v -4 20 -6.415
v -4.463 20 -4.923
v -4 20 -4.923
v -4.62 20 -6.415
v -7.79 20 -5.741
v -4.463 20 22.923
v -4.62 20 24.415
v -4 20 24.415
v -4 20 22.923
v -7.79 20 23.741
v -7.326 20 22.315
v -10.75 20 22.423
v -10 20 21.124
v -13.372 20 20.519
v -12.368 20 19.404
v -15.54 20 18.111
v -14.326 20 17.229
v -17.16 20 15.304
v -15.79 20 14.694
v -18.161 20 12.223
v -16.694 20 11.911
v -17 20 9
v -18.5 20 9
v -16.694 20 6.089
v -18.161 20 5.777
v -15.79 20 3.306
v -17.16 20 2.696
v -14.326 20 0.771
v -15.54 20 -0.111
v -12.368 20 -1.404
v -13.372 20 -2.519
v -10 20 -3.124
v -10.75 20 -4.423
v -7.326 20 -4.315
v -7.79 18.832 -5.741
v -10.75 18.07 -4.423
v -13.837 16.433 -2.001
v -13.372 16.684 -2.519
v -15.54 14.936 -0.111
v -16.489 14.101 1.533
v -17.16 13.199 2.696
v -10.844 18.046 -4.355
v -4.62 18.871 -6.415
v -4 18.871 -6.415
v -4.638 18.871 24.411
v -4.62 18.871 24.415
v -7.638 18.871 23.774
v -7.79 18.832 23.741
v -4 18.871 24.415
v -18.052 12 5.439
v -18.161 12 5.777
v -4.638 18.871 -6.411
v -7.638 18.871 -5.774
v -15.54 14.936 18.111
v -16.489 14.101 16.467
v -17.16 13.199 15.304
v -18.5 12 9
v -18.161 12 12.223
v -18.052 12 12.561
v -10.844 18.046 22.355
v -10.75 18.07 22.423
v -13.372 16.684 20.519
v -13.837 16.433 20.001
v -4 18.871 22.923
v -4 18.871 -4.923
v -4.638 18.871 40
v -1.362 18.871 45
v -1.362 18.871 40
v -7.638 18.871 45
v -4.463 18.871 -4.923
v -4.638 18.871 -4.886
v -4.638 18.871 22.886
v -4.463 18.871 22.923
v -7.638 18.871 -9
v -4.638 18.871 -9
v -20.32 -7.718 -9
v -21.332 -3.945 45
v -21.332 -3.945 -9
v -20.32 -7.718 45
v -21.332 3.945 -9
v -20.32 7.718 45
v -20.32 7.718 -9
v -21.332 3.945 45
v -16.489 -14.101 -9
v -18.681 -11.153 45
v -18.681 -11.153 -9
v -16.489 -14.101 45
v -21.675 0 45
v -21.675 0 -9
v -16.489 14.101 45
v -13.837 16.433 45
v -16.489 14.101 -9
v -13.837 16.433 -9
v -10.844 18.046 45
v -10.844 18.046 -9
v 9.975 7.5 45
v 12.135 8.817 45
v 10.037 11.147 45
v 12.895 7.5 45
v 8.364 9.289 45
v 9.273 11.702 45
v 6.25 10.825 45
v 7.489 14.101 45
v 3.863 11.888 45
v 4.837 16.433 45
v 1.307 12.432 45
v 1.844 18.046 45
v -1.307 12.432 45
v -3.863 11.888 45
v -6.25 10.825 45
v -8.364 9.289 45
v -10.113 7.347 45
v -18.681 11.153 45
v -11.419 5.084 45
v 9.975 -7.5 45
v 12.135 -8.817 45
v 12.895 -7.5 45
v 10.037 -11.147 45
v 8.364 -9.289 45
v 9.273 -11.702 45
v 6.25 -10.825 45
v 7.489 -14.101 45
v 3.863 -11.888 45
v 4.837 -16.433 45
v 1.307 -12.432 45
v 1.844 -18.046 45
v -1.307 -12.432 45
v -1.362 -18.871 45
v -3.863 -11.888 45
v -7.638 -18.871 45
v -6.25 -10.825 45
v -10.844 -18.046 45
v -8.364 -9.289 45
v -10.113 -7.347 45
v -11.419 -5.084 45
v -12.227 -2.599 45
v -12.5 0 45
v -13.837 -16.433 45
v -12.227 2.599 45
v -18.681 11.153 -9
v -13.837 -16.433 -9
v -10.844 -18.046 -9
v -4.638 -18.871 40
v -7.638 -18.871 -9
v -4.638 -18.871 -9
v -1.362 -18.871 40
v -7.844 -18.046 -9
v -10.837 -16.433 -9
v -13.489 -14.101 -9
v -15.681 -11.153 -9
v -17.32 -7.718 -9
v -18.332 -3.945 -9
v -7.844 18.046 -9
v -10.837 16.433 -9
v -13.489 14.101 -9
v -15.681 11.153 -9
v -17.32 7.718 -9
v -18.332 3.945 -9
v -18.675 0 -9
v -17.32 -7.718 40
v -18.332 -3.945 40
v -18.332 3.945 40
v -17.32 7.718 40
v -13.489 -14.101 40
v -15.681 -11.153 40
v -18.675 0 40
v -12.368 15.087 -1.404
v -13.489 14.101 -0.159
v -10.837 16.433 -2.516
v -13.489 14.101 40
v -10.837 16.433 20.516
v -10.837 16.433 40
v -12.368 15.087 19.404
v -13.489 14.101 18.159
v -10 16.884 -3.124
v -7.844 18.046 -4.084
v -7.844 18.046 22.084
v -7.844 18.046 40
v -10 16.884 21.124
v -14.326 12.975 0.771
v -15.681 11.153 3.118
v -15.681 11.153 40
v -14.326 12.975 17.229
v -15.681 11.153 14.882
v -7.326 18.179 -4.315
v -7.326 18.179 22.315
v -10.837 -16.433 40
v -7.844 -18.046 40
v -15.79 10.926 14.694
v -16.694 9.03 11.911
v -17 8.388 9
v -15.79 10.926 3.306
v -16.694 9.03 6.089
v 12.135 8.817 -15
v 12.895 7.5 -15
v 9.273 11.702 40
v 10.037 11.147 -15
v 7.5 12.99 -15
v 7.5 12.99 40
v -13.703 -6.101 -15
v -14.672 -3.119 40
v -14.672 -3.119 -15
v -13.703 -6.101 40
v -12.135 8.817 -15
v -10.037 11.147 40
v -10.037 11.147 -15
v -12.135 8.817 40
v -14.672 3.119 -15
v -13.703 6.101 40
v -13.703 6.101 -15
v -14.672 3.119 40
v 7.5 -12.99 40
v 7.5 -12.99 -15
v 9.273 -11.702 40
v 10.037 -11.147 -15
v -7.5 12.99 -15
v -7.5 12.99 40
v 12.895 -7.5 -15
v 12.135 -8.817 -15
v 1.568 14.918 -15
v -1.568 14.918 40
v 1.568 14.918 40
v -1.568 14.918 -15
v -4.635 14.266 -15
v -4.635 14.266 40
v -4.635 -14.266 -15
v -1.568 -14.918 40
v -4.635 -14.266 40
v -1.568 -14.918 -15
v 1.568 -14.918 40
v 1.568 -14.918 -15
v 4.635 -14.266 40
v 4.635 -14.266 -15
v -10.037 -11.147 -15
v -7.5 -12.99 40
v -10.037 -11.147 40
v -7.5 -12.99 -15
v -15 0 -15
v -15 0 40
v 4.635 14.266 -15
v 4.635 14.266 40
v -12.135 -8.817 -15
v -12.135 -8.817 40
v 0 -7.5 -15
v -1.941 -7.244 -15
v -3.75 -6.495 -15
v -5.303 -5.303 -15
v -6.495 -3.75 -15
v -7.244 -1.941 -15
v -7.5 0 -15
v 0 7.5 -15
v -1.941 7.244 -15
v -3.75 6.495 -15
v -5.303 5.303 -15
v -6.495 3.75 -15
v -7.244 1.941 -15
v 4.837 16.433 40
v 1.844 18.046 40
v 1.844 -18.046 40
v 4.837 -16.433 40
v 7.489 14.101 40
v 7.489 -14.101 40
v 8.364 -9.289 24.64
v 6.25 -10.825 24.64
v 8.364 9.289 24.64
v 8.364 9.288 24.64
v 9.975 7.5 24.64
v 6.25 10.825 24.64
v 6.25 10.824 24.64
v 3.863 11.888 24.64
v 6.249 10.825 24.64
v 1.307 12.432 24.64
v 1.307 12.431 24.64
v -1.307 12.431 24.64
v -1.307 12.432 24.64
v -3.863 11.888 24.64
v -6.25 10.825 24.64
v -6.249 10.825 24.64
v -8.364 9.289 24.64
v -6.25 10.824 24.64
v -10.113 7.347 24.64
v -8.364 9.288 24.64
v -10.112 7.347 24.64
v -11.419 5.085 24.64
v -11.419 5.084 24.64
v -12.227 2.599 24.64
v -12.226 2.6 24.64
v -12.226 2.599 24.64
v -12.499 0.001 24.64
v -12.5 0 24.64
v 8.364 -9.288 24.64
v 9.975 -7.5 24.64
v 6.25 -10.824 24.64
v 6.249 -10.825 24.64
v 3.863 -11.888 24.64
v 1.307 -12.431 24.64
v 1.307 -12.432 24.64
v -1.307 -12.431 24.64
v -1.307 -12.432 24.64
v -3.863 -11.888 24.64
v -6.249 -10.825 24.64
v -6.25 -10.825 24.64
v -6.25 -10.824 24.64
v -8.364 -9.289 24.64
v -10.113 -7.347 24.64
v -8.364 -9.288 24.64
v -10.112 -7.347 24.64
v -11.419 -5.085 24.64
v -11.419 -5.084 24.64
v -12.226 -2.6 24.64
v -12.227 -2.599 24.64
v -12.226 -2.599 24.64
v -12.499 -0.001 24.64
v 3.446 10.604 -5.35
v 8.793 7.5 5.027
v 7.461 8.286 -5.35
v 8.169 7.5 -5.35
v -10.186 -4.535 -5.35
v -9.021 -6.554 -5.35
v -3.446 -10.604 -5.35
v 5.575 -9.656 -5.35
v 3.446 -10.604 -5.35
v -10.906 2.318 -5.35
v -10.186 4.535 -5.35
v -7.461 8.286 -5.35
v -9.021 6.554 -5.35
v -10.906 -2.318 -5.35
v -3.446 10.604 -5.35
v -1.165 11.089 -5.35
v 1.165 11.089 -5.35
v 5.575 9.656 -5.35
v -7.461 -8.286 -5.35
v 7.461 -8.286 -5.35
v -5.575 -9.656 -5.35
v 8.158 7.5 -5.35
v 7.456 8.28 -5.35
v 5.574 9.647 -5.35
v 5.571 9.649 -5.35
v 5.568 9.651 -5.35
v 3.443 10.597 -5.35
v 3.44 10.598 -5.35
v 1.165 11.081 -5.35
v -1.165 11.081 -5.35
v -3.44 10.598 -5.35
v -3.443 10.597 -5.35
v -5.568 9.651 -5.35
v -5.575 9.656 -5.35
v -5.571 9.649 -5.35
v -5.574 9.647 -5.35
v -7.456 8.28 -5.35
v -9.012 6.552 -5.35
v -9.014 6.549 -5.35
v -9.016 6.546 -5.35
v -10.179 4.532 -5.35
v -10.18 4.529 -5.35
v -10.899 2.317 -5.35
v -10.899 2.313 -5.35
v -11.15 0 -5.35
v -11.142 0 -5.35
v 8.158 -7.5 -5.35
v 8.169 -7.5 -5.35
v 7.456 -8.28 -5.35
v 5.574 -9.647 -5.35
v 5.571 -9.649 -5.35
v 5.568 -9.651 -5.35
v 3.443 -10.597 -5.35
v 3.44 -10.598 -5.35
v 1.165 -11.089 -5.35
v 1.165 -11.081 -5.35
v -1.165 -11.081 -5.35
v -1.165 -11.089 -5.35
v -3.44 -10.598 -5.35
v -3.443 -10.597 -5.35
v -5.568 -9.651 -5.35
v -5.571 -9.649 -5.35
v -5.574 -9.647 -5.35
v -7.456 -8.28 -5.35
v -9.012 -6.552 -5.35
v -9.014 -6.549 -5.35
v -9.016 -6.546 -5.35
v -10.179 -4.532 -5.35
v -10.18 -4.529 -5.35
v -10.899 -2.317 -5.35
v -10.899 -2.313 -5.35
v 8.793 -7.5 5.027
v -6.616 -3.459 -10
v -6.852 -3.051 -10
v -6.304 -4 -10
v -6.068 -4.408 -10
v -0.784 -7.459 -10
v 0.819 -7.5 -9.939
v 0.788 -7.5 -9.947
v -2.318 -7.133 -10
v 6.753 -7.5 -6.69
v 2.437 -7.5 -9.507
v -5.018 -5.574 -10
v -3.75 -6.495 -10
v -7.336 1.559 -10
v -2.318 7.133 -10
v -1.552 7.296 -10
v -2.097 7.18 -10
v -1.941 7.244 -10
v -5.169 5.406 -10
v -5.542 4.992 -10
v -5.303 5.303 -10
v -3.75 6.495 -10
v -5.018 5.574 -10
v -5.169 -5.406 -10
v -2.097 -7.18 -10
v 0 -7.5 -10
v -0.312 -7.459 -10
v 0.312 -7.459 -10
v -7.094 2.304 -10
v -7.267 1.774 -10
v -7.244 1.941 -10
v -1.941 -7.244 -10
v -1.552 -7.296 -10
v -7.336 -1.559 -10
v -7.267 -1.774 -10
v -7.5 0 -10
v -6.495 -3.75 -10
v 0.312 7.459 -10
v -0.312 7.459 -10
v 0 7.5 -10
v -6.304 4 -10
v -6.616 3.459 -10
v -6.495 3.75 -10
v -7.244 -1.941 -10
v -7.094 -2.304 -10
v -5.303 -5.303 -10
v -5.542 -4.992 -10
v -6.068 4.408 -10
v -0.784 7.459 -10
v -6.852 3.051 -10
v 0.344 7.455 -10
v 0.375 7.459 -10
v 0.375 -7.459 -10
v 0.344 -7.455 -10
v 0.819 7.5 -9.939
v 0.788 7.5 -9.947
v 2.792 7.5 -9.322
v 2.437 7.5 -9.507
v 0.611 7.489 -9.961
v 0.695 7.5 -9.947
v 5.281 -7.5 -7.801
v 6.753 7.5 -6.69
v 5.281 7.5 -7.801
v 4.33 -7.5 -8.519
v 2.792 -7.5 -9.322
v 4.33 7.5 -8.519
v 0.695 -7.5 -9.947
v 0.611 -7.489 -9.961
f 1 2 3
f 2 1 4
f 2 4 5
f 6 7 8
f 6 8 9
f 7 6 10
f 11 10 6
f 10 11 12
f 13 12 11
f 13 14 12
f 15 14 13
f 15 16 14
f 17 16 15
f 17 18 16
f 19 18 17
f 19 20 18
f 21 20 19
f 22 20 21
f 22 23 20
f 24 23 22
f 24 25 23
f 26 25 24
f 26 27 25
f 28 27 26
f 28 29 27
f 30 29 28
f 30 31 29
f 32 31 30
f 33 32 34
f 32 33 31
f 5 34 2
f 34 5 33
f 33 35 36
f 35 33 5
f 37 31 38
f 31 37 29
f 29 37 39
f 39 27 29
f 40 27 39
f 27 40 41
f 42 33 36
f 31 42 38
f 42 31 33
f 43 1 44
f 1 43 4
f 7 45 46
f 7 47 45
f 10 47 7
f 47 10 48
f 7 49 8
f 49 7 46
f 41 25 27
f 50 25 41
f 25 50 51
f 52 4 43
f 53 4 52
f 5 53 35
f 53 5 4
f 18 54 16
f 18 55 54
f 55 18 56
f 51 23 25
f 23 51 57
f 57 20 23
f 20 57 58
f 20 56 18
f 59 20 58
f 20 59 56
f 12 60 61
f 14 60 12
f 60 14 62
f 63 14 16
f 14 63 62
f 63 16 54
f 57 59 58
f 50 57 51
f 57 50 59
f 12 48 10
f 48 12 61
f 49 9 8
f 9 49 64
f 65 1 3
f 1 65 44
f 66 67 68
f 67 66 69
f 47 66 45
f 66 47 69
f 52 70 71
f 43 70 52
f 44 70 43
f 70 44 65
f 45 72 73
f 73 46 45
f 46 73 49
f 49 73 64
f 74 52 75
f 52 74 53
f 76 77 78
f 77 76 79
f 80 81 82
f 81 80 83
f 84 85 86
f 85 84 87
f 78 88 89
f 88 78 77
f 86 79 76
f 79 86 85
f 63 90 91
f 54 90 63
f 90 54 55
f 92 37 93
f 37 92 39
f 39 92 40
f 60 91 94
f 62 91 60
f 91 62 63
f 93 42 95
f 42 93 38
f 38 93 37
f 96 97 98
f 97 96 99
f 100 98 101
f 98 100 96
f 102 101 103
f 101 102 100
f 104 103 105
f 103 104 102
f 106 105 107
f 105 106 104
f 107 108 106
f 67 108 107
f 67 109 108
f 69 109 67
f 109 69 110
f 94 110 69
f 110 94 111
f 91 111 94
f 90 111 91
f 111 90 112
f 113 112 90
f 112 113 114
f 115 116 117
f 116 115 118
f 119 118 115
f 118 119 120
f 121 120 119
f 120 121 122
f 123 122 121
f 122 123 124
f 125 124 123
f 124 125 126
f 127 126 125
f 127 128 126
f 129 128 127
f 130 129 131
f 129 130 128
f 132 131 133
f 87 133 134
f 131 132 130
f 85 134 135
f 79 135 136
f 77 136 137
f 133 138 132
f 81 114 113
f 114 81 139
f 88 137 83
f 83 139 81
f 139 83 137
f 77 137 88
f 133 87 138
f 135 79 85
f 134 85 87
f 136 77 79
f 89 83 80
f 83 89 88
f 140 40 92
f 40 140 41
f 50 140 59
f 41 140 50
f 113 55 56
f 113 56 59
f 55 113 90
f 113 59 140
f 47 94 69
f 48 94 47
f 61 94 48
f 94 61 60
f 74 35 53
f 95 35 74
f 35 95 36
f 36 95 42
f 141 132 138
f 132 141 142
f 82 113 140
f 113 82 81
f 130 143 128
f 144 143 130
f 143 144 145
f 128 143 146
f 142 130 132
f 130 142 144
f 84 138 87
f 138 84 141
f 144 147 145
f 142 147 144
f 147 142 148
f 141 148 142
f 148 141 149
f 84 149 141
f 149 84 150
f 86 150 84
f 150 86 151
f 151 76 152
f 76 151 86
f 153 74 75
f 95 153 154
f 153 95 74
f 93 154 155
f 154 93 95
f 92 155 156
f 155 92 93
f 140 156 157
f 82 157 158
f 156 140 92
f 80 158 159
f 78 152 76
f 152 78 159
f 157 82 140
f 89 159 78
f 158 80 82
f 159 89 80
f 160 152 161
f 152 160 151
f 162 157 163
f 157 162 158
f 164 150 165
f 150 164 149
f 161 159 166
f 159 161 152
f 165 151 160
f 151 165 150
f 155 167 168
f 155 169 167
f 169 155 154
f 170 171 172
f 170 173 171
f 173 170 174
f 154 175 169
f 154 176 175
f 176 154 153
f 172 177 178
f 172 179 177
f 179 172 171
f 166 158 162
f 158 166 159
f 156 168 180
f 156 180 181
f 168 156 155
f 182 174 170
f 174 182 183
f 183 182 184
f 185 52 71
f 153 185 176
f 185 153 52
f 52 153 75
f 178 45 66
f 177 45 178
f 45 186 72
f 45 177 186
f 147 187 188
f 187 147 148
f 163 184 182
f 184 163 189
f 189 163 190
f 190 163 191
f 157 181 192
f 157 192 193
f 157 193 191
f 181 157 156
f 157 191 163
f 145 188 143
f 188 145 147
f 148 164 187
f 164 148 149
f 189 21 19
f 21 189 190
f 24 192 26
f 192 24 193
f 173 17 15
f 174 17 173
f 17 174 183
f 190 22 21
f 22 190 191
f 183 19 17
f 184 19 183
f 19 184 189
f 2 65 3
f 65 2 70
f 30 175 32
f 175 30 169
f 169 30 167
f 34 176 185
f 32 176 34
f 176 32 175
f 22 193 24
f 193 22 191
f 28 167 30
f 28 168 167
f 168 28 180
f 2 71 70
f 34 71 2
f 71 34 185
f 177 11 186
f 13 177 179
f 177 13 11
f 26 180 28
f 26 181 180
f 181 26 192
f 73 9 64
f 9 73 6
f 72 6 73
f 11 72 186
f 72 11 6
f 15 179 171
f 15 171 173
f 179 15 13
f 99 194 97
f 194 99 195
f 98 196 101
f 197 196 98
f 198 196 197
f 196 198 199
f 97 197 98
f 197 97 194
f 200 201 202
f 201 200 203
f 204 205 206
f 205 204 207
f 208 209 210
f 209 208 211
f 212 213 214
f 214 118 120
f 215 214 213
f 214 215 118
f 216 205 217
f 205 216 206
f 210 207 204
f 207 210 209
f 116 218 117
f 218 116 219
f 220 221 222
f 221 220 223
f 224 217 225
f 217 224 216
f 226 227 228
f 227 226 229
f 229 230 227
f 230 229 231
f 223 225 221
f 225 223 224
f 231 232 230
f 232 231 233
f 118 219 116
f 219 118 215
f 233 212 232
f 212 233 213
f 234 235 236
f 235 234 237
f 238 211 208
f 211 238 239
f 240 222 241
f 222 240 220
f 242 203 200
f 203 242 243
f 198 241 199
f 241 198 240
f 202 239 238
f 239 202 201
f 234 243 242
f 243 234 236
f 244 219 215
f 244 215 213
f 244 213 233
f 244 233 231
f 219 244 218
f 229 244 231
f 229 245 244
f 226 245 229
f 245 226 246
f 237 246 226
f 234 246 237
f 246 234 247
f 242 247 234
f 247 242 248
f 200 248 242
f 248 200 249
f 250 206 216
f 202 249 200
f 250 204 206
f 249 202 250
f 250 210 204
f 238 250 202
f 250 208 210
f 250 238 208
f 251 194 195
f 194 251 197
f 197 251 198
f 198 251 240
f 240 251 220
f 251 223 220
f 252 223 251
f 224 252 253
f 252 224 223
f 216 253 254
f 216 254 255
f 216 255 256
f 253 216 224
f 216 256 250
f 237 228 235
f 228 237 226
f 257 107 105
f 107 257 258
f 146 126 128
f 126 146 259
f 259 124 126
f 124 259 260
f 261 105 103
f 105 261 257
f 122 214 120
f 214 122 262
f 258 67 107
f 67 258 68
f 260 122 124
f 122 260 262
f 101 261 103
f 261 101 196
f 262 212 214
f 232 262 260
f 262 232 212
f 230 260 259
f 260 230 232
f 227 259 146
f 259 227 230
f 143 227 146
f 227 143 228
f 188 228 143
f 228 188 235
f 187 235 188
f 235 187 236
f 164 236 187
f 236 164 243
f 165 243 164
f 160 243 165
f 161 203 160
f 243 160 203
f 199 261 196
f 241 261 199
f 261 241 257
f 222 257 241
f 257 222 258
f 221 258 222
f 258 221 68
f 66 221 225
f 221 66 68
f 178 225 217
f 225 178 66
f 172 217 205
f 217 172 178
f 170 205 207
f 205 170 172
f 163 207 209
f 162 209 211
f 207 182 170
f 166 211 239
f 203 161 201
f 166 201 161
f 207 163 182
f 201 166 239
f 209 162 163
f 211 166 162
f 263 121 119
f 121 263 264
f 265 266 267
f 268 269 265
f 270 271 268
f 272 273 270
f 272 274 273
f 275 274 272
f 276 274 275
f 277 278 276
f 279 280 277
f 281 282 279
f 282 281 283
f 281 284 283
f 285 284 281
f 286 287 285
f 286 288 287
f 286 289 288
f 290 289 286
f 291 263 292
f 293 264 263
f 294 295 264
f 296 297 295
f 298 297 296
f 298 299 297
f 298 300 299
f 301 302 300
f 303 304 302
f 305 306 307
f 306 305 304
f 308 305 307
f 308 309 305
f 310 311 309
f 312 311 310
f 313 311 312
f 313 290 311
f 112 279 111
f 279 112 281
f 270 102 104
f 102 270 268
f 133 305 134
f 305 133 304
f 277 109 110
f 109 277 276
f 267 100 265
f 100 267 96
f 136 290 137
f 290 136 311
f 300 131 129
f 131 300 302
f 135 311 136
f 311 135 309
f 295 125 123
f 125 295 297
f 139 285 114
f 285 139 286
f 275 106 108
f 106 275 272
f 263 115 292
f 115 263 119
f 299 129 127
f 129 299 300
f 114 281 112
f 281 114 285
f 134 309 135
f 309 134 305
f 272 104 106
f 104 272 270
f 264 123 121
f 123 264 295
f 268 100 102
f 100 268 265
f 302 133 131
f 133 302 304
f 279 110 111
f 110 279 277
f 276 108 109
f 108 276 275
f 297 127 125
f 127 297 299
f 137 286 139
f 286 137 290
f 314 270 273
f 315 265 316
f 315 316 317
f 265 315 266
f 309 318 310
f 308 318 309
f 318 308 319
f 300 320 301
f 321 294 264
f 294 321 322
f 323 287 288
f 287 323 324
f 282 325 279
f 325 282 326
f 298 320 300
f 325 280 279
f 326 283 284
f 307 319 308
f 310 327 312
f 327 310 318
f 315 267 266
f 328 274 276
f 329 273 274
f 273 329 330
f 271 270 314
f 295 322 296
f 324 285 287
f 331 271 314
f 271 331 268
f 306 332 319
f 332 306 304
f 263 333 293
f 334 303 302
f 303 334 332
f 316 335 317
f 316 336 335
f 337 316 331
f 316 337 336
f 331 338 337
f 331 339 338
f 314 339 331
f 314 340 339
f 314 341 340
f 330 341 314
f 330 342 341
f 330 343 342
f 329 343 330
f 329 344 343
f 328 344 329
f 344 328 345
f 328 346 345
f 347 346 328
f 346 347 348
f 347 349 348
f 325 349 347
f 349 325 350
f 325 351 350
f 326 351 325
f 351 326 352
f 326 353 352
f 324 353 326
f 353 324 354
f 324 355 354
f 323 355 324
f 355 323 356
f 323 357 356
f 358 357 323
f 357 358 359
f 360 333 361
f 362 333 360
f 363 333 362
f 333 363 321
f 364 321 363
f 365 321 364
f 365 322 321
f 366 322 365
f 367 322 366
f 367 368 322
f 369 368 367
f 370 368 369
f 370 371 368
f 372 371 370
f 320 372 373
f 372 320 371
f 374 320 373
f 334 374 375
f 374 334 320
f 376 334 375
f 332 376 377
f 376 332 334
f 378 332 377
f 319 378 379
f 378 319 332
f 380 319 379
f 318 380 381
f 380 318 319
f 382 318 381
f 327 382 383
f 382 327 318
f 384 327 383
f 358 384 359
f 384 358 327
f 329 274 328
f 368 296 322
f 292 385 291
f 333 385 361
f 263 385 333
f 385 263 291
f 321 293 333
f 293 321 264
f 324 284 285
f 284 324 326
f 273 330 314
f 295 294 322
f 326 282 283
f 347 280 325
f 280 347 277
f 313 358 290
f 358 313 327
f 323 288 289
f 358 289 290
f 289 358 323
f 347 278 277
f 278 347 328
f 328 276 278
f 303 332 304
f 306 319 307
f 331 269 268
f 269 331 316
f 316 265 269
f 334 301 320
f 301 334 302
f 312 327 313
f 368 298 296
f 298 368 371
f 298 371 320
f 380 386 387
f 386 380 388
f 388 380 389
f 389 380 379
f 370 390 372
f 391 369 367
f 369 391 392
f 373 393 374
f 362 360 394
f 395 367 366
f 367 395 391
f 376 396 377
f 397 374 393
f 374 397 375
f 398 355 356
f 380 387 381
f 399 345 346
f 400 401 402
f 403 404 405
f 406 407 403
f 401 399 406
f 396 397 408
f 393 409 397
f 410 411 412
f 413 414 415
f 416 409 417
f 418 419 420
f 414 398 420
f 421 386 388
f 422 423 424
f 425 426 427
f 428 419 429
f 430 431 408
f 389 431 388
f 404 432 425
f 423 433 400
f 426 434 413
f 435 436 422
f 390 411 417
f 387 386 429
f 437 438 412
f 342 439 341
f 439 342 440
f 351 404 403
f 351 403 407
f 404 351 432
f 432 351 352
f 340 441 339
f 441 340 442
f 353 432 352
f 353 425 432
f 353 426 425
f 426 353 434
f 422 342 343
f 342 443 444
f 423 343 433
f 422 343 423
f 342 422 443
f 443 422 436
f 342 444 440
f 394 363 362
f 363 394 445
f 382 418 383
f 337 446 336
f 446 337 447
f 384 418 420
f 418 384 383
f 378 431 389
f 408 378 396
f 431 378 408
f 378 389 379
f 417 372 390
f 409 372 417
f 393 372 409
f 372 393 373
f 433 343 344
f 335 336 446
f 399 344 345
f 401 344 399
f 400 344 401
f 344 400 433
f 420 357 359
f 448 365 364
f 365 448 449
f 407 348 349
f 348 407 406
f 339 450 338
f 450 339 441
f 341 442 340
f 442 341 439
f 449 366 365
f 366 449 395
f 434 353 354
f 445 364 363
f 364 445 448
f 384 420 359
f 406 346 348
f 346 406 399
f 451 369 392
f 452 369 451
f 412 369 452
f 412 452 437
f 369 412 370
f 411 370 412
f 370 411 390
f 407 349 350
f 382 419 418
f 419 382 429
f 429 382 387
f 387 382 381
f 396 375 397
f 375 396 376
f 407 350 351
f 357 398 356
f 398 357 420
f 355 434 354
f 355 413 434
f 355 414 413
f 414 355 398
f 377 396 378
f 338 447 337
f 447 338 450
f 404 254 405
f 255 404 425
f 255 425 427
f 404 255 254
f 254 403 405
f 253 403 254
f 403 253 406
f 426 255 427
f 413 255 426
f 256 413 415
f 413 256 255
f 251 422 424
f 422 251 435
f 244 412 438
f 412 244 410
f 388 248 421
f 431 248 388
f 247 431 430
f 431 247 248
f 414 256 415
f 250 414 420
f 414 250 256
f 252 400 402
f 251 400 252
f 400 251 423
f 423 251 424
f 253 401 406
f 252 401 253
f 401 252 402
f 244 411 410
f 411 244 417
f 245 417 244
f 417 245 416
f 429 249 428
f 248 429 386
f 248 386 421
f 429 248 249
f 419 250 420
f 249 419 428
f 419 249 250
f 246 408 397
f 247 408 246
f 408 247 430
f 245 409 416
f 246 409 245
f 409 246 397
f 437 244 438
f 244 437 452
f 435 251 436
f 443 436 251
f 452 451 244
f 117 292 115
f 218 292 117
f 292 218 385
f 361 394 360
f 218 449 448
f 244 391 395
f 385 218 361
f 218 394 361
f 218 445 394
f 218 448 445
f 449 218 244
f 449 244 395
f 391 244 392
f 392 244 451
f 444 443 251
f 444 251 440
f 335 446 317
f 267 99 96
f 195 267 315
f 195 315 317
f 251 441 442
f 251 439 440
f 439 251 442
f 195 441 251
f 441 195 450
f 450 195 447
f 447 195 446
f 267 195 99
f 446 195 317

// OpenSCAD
// Copyright 2024 Heikki Suonsivu
// Licensed under Creative Commons CC-BY-NC-SA, see https://creativecommons.org/licenses/by-nc-sa/4.0/
// For commercial licensing, please contact directly, hsu-3d@suonsivu.net, +358 40 551 9679

include <hsu.scad>

suihkuletkud=14;
suihkuletkuh=100;
suihkupaaconnect1d=21.3;
suihkupaaconnect2d=24; // measured? 23.3;
suihkupaaconnectl=30;
suihkupaabodyd=24;
suihkupaal=200; // Not measured, guess
suihkupaaheight=-10;
letkutolerance=1;

tukil=50;
tukiind=30;
tukioutd=tukiind+3;
tukioutoffset=3;
tukiinterfaced=28;
tukiinterfaceoffset=tukiind/2-3;
tukiinterfacel=8; // Not measured, guess
tukiinterfaceheight=5; // Not measured, guess
tukiheight=-10;

pidikeheight=-15;
pidikedtolerance=1;
pidikel=tukil+10;
pidiketopsupporth=5;
pidikesupporth=pidikel-6;
pidikewall=3;
pidikeflangeh=0;
pidikeflangewall=pidikewall+2;
echo(pidiketopsupporth);
  
module suihkupaa() {
  translate([0,0,0]) cylinder(h=suihkupaaconnectl,d1=suihkupaaconnect1d,d2=suihkupaaconnect2d);
  translate([0,0,suihkupaaconnectl-0.01]) cylinder(d=suihkupaabodyd,h=suihkupaal);
  translate([0,0,-suihkuletkuh]) cylinder(d=suihkuletkud,h=suihkuletkuh);
}

module oldpidike() {
  difference() {
    translate([-tukioutoffset,0,0]) scale([0.95,1.15,1]) cylinder(d=tukioutd,h=tukil);
    translate([0,0,-0.01]) cylinder(d=tukiind,h=tukil+0.02);
  }
  translate([-tukioutoffset,tukiind/2,tukiinterfaceheight+tukiinterfaced/2]) rotate([-90,0,0]) cylinder(d=tukiinterfaced,h=tukiinterfacel);
}

module pidike() {
  difference() {
    union() {
      cylinder(d=tukiind,h=pidikel);
      hull() {
	translate([-tukioutoffset,0,pidikel-pidiketopsupporth]) scale([0.95,1.15,1]) cylinder(d=tukioutd,h=pidiketopsupporth);
	translate([-tukioutoffset-(tukioutd-tukiind),0,pidikel-pidiketopsupporth]) scale([0.95,1.15,1]) cylinder(d=tukioutd,h=pidiketopsupporth);
      }
      difference() {
	union() {
	  translate([-tukioutoffset-(tukioutd-tukiind),0,pidikel-pidikesupporth]) scale([0.95,1.15,1]) cylinder(d=tukioutd,h=pidikesupporth);
	  translate([0,0,tukiheight-pidikeheight]) difference() {
	    intersection() {
	      union() {
		translate([-tukioutoffset,tukiinterfaceoffset,tukiinterfaceheight+tukiinterfaced/2]) rotate([-90,0,0]) cylinder(d=tukiinterfaced+pidikewall,h=tukiinterfacel+pidikeflangeh);
		translate([-tukioutoffset,tukiinterfaceoffset+tukiinterfacel,tukiinterfaceheight+tukiinterfaced/2]) rotate([-90,0,0]) cylinder(d=tukiinterfaced+pidikewall+pidikeflangewall,h=pidikeflangeh);
	      }
	      translate([-tukioutoffset-tukiinterfaced-4,tukiinterfaceoffset,tukiinterfaceheight-pidikewall]) cube([tukiinterfaced+pidikewall,tukiinterfaced/2,tukiinterfaced+pidikewall*2]);
	    }
	    translate([-tukioutoffset,0,0]) scale([0.95,1.15,1]) cylinder(d=tukioutd,h=pidikesupporth);
	  }
	}
	translate([-tukioutoffset,0,pidikel-pidikesupporth-0.01]) scale([0.95,1.15,1]) cylinder(d=tukioutd,h=pidikesupporth+0.01);
    translate([0,0,tukiheight-pidikeheight]) difference() {
      translate([-tukioutoffset,0,tukiinterfaceheight+tukiinterfaced/2]) rotate([-90,0,0]) cylinder(d=tukiinterfaced,h=tukiind/2+tukiinterfacel+pidikeflangeh+0.01);
    }
      }
    }
    translate([0,0,-pidikeheight+suihkupaaheight]) union() {
      translate([0,0,suihkupaaconnectl+(suihkupaaconnect1d+pidikedtolerance-suihkuletkud+pidikedtolerance)/2-0.01]) cylinder(d=suihkupaabodyd+pidikedtolerance,h=suihkupaal);
      translate([0,0,(suihkupaaconnect1d+pidikedtolerance-suihkuletkud+pidikedtolerance)/2]) cylinder(h=suihkupaaconnectl,d1=suihkupaaconnect1d+pidikedtolerance,d2=suihkupaaconnect2d+pidikedtolerance);
      translate([0,0,0]) cylinder(h=(suihkupaaconnect1d+pidikedtolerance-suihkuletkud+pidikedtolerance)/2+0.01,d1=suihkuletkud+pidikedtolerance,d2=suihkupaaconnect1d+pidikedtolerance);
      translate([0,0,-suihkuletkuh]) cylinder(d=suihkuletkud+pidikedtolerance,h=suihkuletkuh);
    }
    hull() {
      translate([0,0,-suihkuletkuh]) cylinder(d=suihkuletkud+pidikedtolerance,h=suihkuletkuh);
      translate([tukioutd/2,0,-0.01]) cylinder(d=suihkuletkud+pidikedtolerance,h=pidikel*2);
    }

  }
}

//#translate([0,0,tukiheight]) oldpidike();
//#translate([0,0,suihkupaaheight]) suihkupaa();
translate([0,0,pidikeheight]) pidike();
